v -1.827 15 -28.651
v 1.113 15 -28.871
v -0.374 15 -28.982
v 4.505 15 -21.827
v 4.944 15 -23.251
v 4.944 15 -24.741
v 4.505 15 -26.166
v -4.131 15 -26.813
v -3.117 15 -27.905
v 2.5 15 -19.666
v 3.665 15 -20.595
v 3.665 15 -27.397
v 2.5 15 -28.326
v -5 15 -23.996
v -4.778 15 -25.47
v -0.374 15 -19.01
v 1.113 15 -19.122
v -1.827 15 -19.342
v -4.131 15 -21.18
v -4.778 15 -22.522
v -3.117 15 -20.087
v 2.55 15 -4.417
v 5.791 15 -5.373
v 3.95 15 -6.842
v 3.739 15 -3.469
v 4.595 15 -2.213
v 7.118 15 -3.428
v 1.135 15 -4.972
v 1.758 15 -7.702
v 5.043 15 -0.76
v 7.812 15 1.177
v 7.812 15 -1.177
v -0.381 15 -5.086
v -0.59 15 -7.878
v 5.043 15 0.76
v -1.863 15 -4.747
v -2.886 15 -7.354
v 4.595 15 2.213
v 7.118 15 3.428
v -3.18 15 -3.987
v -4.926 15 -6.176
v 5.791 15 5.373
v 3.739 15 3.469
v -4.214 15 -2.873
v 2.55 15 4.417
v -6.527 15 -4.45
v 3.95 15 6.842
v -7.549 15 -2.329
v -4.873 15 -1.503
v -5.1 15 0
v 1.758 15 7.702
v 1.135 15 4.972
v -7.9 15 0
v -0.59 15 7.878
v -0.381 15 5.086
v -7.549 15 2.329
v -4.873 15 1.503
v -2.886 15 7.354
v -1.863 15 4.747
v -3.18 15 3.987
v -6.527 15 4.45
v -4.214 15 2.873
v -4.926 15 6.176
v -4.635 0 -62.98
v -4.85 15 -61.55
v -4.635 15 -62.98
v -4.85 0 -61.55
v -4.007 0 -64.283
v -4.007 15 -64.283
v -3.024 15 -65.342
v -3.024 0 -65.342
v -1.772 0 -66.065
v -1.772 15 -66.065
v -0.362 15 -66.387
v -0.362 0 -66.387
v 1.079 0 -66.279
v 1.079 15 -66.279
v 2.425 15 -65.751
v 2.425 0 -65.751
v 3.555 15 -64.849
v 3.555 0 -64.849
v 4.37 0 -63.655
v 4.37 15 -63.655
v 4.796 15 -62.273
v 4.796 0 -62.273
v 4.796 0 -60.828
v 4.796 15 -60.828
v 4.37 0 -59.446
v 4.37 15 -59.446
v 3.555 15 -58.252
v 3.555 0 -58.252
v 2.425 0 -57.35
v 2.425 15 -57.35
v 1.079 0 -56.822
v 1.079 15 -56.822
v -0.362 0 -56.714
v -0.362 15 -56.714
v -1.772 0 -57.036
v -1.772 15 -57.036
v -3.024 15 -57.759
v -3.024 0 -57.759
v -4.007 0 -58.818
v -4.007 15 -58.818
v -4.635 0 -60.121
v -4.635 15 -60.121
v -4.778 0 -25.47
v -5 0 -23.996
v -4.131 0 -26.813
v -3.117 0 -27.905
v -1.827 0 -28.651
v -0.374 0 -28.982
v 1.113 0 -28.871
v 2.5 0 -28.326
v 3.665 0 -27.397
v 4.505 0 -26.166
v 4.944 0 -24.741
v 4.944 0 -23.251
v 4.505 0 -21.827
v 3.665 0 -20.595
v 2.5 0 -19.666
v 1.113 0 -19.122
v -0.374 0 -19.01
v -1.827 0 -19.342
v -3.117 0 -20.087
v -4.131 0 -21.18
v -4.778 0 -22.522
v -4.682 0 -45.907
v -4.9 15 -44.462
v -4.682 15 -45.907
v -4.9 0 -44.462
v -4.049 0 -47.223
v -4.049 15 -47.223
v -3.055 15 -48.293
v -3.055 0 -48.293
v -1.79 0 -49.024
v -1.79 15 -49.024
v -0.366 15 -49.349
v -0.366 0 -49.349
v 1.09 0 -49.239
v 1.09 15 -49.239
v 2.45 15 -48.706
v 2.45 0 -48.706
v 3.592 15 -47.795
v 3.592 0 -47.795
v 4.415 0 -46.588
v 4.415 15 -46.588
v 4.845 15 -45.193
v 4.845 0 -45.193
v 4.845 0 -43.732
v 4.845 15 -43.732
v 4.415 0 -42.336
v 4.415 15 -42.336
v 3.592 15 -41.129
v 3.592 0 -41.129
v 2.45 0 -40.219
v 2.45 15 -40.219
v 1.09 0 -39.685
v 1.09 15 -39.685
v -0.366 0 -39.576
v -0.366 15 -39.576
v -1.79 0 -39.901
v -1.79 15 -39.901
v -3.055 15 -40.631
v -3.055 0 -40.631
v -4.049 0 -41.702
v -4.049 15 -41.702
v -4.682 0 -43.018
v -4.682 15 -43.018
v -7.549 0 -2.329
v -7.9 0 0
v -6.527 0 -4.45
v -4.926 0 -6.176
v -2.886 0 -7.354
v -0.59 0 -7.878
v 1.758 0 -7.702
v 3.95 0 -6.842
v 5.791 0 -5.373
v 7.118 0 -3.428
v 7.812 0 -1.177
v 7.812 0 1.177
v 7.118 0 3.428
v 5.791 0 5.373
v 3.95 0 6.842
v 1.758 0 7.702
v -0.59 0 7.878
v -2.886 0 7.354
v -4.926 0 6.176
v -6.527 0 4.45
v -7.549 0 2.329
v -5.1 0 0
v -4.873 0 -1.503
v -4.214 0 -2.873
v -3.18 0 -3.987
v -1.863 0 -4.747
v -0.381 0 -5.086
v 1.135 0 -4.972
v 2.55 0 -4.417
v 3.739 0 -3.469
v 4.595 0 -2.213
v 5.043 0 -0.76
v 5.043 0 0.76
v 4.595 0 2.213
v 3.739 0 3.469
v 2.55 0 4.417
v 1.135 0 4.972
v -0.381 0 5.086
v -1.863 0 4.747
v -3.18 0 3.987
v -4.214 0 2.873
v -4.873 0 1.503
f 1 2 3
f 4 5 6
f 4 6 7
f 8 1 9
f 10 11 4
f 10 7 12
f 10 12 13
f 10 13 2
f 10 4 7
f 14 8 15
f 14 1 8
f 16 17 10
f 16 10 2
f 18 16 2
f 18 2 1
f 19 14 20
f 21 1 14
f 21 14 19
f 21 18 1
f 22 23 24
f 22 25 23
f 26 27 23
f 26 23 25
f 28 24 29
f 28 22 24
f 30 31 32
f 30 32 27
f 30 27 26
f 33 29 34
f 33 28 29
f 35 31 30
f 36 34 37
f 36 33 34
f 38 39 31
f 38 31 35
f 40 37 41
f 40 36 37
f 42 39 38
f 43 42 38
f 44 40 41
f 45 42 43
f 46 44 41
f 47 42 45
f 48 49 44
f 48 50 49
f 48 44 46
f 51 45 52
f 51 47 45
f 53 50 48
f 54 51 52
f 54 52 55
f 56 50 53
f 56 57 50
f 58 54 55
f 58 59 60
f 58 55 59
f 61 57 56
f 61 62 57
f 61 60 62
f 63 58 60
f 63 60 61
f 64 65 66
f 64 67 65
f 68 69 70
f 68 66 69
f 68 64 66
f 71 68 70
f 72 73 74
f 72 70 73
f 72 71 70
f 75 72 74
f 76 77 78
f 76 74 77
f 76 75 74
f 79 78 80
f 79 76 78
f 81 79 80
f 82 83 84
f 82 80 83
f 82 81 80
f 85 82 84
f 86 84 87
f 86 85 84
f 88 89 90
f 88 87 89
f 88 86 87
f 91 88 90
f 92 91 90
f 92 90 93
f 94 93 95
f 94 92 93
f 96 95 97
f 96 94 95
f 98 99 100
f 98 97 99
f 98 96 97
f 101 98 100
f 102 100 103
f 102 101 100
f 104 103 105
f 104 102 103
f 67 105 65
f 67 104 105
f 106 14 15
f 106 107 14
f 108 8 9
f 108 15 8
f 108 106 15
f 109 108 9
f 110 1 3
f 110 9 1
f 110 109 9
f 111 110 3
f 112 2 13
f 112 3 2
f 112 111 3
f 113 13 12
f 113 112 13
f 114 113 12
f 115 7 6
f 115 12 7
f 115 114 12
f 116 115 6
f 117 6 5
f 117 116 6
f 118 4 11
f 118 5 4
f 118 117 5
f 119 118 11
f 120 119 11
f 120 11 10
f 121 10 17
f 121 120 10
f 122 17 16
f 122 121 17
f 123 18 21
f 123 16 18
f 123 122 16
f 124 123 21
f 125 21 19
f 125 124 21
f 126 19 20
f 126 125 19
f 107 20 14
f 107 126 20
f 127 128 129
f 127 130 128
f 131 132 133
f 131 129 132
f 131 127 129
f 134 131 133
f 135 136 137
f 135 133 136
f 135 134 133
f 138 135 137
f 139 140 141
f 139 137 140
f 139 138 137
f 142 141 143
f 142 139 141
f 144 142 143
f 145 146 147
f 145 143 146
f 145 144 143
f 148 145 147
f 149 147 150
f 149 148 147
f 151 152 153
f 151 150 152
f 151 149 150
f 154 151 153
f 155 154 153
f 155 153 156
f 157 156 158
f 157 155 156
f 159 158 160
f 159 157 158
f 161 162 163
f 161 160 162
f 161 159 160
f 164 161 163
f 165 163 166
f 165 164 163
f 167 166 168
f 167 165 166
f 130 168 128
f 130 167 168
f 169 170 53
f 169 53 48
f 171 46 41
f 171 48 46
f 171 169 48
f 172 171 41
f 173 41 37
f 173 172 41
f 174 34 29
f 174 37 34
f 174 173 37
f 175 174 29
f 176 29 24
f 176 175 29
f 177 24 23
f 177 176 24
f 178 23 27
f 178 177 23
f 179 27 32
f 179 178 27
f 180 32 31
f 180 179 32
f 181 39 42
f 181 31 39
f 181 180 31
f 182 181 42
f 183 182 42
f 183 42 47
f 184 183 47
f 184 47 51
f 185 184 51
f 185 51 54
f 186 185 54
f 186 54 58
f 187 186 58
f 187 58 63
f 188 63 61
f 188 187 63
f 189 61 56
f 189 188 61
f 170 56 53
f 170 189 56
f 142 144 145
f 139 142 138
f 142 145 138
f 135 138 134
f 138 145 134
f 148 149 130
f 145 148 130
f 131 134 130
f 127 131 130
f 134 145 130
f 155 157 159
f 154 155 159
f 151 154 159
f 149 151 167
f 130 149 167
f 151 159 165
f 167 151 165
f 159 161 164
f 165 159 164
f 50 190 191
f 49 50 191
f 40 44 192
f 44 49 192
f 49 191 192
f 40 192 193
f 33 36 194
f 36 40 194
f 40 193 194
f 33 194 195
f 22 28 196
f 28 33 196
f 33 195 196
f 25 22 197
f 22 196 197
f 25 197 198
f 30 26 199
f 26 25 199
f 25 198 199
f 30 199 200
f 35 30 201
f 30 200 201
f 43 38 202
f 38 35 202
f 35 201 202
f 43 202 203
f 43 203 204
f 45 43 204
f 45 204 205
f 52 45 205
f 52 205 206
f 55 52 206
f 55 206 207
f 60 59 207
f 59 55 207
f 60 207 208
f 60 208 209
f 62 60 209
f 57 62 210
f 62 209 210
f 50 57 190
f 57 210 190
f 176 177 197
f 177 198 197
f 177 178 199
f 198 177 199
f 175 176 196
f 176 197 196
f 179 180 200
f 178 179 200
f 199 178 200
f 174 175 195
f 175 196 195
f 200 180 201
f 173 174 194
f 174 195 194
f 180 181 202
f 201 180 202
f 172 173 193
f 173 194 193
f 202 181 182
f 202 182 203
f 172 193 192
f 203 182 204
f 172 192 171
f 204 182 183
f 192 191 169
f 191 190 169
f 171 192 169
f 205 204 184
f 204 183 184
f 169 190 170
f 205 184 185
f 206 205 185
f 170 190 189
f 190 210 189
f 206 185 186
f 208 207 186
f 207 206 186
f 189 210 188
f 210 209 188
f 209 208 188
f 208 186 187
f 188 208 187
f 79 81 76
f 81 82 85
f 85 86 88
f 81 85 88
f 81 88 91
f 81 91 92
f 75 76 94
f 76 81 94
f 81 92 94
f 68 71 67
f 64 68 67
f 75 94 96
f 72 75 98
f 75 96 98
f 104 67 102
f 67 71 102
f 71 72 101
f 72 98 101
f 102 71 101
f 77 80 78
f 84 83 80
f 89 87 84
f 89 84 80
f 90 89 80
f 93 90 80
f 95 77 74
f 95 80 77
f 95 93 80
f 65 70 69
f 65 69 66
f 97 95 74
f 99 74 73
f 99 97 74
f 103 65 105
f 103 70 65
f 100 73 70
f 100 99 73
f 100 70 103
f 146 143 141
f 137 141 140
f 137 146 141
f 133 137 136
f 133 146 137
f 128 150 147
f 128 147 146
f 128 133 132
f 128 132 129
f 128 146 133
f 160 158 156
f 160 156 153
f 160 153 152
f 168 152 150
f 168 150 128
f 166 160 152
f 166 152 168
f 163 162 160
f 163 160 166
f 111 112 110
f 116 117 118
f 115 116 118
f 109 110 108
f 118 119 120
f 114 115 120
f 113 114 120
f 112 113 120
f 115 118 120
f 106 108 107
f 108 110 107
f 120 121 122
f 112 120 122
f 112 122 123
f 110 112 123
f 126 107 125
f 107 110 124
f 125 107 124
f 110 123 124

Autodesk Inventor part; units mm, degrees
ref_plane "YZ Plane" through (0, 0, 0) normal (1, 0, 0) x (0, 1, 0)
ref_plane "XZ Plane" through (0, 0, 0) normal (0, 1, 0) x (-1, 0, 0)
ref_plane "XY Plane" through (0, 0, 0) normal (0, 0, 1) x (1, 0, 0)
sketch "Эскиз1" plane through (0, 0, 0) normal (0, 1, 0) x (-1, 0, 0)
  circle A0 centre (0, 0) radius 5.1
  circle A1 centre (0, 0) radius 7.9
  circle A2 centre (0, -23.9962) radius 5
  circle A3 centre (0, -44.4623) radius 4.9
  circle A4 centre (0, -61.5505) radius 4.85
  dimension "d0" = 10.2
  dimension "d1" = 15.8
  dimension "d2" = 10
  dimension "d3" = 9.8
  dimension "d4" = 9.7
extrude "Выдавливание1" add sketch "Эскиз1" along normal blind 15
sketch "Эскиз2" plane through (0, 15, -23.9962) normal (0, 1, 0) x (1, 0, 0)
  line L0 (-2.1701, 1.6946) -> (2.4044, 1.6946) construction
  line L1 (2.4044, 1.6946) -> (2.4044, -1.4794) construction
  line L2 (2.4044, -1.4794) -> (-2.1701, -1.4794) construction
  line L3 (-2.1701, -1.4794) -> (-2.1701, 1.6946) construction
  line L4 (-3.1832, 22.0453) -> (2.6609, 22.0453) construction
  line L5 (2.6609, 22.0453) -> (2.6609, 18.1698) construction
  line L6 (2.6609, 18.1698) -> (-3.1832, 18.1698) construction
  line L7 (-3.1832, 18.1698) -> (-3.1832, 22.0453) construction
  line L8 (-2.9124, 39.0147) -> (2.9316, 39.0147) construction
  line L9 (2.9316, 39.0147) -> (2.9316, 35.1466) construction
  line L10 (2.9316, 35.1466) -> (-2.9124, 35.1466) construction
  line L11 (-2.9124, 35.1466) -> (-2.9124, 39.0147) construction
  point P0 (0, -23.9962)
equation "\"Радиус_гибки\" = Толщина"
equation "\"Ширина_просечки\" = Толщина"
equation "\"Глубина_просечки\" = 0.5 * Толщина"
equation "\"Размер_просечки\" = 4 * Толщина"
equation "\"Мин_остаток\" = 2 * Толщина"
equation "\"Радиус_перехода\" = Радиус_гибки"
equation "\"Радиус_Якоби\" = Толщина"
equation "\"Размер_зазора\" = Толщина"
equation "\"Толщина\" = 0.5"
properties part number "Тест"
